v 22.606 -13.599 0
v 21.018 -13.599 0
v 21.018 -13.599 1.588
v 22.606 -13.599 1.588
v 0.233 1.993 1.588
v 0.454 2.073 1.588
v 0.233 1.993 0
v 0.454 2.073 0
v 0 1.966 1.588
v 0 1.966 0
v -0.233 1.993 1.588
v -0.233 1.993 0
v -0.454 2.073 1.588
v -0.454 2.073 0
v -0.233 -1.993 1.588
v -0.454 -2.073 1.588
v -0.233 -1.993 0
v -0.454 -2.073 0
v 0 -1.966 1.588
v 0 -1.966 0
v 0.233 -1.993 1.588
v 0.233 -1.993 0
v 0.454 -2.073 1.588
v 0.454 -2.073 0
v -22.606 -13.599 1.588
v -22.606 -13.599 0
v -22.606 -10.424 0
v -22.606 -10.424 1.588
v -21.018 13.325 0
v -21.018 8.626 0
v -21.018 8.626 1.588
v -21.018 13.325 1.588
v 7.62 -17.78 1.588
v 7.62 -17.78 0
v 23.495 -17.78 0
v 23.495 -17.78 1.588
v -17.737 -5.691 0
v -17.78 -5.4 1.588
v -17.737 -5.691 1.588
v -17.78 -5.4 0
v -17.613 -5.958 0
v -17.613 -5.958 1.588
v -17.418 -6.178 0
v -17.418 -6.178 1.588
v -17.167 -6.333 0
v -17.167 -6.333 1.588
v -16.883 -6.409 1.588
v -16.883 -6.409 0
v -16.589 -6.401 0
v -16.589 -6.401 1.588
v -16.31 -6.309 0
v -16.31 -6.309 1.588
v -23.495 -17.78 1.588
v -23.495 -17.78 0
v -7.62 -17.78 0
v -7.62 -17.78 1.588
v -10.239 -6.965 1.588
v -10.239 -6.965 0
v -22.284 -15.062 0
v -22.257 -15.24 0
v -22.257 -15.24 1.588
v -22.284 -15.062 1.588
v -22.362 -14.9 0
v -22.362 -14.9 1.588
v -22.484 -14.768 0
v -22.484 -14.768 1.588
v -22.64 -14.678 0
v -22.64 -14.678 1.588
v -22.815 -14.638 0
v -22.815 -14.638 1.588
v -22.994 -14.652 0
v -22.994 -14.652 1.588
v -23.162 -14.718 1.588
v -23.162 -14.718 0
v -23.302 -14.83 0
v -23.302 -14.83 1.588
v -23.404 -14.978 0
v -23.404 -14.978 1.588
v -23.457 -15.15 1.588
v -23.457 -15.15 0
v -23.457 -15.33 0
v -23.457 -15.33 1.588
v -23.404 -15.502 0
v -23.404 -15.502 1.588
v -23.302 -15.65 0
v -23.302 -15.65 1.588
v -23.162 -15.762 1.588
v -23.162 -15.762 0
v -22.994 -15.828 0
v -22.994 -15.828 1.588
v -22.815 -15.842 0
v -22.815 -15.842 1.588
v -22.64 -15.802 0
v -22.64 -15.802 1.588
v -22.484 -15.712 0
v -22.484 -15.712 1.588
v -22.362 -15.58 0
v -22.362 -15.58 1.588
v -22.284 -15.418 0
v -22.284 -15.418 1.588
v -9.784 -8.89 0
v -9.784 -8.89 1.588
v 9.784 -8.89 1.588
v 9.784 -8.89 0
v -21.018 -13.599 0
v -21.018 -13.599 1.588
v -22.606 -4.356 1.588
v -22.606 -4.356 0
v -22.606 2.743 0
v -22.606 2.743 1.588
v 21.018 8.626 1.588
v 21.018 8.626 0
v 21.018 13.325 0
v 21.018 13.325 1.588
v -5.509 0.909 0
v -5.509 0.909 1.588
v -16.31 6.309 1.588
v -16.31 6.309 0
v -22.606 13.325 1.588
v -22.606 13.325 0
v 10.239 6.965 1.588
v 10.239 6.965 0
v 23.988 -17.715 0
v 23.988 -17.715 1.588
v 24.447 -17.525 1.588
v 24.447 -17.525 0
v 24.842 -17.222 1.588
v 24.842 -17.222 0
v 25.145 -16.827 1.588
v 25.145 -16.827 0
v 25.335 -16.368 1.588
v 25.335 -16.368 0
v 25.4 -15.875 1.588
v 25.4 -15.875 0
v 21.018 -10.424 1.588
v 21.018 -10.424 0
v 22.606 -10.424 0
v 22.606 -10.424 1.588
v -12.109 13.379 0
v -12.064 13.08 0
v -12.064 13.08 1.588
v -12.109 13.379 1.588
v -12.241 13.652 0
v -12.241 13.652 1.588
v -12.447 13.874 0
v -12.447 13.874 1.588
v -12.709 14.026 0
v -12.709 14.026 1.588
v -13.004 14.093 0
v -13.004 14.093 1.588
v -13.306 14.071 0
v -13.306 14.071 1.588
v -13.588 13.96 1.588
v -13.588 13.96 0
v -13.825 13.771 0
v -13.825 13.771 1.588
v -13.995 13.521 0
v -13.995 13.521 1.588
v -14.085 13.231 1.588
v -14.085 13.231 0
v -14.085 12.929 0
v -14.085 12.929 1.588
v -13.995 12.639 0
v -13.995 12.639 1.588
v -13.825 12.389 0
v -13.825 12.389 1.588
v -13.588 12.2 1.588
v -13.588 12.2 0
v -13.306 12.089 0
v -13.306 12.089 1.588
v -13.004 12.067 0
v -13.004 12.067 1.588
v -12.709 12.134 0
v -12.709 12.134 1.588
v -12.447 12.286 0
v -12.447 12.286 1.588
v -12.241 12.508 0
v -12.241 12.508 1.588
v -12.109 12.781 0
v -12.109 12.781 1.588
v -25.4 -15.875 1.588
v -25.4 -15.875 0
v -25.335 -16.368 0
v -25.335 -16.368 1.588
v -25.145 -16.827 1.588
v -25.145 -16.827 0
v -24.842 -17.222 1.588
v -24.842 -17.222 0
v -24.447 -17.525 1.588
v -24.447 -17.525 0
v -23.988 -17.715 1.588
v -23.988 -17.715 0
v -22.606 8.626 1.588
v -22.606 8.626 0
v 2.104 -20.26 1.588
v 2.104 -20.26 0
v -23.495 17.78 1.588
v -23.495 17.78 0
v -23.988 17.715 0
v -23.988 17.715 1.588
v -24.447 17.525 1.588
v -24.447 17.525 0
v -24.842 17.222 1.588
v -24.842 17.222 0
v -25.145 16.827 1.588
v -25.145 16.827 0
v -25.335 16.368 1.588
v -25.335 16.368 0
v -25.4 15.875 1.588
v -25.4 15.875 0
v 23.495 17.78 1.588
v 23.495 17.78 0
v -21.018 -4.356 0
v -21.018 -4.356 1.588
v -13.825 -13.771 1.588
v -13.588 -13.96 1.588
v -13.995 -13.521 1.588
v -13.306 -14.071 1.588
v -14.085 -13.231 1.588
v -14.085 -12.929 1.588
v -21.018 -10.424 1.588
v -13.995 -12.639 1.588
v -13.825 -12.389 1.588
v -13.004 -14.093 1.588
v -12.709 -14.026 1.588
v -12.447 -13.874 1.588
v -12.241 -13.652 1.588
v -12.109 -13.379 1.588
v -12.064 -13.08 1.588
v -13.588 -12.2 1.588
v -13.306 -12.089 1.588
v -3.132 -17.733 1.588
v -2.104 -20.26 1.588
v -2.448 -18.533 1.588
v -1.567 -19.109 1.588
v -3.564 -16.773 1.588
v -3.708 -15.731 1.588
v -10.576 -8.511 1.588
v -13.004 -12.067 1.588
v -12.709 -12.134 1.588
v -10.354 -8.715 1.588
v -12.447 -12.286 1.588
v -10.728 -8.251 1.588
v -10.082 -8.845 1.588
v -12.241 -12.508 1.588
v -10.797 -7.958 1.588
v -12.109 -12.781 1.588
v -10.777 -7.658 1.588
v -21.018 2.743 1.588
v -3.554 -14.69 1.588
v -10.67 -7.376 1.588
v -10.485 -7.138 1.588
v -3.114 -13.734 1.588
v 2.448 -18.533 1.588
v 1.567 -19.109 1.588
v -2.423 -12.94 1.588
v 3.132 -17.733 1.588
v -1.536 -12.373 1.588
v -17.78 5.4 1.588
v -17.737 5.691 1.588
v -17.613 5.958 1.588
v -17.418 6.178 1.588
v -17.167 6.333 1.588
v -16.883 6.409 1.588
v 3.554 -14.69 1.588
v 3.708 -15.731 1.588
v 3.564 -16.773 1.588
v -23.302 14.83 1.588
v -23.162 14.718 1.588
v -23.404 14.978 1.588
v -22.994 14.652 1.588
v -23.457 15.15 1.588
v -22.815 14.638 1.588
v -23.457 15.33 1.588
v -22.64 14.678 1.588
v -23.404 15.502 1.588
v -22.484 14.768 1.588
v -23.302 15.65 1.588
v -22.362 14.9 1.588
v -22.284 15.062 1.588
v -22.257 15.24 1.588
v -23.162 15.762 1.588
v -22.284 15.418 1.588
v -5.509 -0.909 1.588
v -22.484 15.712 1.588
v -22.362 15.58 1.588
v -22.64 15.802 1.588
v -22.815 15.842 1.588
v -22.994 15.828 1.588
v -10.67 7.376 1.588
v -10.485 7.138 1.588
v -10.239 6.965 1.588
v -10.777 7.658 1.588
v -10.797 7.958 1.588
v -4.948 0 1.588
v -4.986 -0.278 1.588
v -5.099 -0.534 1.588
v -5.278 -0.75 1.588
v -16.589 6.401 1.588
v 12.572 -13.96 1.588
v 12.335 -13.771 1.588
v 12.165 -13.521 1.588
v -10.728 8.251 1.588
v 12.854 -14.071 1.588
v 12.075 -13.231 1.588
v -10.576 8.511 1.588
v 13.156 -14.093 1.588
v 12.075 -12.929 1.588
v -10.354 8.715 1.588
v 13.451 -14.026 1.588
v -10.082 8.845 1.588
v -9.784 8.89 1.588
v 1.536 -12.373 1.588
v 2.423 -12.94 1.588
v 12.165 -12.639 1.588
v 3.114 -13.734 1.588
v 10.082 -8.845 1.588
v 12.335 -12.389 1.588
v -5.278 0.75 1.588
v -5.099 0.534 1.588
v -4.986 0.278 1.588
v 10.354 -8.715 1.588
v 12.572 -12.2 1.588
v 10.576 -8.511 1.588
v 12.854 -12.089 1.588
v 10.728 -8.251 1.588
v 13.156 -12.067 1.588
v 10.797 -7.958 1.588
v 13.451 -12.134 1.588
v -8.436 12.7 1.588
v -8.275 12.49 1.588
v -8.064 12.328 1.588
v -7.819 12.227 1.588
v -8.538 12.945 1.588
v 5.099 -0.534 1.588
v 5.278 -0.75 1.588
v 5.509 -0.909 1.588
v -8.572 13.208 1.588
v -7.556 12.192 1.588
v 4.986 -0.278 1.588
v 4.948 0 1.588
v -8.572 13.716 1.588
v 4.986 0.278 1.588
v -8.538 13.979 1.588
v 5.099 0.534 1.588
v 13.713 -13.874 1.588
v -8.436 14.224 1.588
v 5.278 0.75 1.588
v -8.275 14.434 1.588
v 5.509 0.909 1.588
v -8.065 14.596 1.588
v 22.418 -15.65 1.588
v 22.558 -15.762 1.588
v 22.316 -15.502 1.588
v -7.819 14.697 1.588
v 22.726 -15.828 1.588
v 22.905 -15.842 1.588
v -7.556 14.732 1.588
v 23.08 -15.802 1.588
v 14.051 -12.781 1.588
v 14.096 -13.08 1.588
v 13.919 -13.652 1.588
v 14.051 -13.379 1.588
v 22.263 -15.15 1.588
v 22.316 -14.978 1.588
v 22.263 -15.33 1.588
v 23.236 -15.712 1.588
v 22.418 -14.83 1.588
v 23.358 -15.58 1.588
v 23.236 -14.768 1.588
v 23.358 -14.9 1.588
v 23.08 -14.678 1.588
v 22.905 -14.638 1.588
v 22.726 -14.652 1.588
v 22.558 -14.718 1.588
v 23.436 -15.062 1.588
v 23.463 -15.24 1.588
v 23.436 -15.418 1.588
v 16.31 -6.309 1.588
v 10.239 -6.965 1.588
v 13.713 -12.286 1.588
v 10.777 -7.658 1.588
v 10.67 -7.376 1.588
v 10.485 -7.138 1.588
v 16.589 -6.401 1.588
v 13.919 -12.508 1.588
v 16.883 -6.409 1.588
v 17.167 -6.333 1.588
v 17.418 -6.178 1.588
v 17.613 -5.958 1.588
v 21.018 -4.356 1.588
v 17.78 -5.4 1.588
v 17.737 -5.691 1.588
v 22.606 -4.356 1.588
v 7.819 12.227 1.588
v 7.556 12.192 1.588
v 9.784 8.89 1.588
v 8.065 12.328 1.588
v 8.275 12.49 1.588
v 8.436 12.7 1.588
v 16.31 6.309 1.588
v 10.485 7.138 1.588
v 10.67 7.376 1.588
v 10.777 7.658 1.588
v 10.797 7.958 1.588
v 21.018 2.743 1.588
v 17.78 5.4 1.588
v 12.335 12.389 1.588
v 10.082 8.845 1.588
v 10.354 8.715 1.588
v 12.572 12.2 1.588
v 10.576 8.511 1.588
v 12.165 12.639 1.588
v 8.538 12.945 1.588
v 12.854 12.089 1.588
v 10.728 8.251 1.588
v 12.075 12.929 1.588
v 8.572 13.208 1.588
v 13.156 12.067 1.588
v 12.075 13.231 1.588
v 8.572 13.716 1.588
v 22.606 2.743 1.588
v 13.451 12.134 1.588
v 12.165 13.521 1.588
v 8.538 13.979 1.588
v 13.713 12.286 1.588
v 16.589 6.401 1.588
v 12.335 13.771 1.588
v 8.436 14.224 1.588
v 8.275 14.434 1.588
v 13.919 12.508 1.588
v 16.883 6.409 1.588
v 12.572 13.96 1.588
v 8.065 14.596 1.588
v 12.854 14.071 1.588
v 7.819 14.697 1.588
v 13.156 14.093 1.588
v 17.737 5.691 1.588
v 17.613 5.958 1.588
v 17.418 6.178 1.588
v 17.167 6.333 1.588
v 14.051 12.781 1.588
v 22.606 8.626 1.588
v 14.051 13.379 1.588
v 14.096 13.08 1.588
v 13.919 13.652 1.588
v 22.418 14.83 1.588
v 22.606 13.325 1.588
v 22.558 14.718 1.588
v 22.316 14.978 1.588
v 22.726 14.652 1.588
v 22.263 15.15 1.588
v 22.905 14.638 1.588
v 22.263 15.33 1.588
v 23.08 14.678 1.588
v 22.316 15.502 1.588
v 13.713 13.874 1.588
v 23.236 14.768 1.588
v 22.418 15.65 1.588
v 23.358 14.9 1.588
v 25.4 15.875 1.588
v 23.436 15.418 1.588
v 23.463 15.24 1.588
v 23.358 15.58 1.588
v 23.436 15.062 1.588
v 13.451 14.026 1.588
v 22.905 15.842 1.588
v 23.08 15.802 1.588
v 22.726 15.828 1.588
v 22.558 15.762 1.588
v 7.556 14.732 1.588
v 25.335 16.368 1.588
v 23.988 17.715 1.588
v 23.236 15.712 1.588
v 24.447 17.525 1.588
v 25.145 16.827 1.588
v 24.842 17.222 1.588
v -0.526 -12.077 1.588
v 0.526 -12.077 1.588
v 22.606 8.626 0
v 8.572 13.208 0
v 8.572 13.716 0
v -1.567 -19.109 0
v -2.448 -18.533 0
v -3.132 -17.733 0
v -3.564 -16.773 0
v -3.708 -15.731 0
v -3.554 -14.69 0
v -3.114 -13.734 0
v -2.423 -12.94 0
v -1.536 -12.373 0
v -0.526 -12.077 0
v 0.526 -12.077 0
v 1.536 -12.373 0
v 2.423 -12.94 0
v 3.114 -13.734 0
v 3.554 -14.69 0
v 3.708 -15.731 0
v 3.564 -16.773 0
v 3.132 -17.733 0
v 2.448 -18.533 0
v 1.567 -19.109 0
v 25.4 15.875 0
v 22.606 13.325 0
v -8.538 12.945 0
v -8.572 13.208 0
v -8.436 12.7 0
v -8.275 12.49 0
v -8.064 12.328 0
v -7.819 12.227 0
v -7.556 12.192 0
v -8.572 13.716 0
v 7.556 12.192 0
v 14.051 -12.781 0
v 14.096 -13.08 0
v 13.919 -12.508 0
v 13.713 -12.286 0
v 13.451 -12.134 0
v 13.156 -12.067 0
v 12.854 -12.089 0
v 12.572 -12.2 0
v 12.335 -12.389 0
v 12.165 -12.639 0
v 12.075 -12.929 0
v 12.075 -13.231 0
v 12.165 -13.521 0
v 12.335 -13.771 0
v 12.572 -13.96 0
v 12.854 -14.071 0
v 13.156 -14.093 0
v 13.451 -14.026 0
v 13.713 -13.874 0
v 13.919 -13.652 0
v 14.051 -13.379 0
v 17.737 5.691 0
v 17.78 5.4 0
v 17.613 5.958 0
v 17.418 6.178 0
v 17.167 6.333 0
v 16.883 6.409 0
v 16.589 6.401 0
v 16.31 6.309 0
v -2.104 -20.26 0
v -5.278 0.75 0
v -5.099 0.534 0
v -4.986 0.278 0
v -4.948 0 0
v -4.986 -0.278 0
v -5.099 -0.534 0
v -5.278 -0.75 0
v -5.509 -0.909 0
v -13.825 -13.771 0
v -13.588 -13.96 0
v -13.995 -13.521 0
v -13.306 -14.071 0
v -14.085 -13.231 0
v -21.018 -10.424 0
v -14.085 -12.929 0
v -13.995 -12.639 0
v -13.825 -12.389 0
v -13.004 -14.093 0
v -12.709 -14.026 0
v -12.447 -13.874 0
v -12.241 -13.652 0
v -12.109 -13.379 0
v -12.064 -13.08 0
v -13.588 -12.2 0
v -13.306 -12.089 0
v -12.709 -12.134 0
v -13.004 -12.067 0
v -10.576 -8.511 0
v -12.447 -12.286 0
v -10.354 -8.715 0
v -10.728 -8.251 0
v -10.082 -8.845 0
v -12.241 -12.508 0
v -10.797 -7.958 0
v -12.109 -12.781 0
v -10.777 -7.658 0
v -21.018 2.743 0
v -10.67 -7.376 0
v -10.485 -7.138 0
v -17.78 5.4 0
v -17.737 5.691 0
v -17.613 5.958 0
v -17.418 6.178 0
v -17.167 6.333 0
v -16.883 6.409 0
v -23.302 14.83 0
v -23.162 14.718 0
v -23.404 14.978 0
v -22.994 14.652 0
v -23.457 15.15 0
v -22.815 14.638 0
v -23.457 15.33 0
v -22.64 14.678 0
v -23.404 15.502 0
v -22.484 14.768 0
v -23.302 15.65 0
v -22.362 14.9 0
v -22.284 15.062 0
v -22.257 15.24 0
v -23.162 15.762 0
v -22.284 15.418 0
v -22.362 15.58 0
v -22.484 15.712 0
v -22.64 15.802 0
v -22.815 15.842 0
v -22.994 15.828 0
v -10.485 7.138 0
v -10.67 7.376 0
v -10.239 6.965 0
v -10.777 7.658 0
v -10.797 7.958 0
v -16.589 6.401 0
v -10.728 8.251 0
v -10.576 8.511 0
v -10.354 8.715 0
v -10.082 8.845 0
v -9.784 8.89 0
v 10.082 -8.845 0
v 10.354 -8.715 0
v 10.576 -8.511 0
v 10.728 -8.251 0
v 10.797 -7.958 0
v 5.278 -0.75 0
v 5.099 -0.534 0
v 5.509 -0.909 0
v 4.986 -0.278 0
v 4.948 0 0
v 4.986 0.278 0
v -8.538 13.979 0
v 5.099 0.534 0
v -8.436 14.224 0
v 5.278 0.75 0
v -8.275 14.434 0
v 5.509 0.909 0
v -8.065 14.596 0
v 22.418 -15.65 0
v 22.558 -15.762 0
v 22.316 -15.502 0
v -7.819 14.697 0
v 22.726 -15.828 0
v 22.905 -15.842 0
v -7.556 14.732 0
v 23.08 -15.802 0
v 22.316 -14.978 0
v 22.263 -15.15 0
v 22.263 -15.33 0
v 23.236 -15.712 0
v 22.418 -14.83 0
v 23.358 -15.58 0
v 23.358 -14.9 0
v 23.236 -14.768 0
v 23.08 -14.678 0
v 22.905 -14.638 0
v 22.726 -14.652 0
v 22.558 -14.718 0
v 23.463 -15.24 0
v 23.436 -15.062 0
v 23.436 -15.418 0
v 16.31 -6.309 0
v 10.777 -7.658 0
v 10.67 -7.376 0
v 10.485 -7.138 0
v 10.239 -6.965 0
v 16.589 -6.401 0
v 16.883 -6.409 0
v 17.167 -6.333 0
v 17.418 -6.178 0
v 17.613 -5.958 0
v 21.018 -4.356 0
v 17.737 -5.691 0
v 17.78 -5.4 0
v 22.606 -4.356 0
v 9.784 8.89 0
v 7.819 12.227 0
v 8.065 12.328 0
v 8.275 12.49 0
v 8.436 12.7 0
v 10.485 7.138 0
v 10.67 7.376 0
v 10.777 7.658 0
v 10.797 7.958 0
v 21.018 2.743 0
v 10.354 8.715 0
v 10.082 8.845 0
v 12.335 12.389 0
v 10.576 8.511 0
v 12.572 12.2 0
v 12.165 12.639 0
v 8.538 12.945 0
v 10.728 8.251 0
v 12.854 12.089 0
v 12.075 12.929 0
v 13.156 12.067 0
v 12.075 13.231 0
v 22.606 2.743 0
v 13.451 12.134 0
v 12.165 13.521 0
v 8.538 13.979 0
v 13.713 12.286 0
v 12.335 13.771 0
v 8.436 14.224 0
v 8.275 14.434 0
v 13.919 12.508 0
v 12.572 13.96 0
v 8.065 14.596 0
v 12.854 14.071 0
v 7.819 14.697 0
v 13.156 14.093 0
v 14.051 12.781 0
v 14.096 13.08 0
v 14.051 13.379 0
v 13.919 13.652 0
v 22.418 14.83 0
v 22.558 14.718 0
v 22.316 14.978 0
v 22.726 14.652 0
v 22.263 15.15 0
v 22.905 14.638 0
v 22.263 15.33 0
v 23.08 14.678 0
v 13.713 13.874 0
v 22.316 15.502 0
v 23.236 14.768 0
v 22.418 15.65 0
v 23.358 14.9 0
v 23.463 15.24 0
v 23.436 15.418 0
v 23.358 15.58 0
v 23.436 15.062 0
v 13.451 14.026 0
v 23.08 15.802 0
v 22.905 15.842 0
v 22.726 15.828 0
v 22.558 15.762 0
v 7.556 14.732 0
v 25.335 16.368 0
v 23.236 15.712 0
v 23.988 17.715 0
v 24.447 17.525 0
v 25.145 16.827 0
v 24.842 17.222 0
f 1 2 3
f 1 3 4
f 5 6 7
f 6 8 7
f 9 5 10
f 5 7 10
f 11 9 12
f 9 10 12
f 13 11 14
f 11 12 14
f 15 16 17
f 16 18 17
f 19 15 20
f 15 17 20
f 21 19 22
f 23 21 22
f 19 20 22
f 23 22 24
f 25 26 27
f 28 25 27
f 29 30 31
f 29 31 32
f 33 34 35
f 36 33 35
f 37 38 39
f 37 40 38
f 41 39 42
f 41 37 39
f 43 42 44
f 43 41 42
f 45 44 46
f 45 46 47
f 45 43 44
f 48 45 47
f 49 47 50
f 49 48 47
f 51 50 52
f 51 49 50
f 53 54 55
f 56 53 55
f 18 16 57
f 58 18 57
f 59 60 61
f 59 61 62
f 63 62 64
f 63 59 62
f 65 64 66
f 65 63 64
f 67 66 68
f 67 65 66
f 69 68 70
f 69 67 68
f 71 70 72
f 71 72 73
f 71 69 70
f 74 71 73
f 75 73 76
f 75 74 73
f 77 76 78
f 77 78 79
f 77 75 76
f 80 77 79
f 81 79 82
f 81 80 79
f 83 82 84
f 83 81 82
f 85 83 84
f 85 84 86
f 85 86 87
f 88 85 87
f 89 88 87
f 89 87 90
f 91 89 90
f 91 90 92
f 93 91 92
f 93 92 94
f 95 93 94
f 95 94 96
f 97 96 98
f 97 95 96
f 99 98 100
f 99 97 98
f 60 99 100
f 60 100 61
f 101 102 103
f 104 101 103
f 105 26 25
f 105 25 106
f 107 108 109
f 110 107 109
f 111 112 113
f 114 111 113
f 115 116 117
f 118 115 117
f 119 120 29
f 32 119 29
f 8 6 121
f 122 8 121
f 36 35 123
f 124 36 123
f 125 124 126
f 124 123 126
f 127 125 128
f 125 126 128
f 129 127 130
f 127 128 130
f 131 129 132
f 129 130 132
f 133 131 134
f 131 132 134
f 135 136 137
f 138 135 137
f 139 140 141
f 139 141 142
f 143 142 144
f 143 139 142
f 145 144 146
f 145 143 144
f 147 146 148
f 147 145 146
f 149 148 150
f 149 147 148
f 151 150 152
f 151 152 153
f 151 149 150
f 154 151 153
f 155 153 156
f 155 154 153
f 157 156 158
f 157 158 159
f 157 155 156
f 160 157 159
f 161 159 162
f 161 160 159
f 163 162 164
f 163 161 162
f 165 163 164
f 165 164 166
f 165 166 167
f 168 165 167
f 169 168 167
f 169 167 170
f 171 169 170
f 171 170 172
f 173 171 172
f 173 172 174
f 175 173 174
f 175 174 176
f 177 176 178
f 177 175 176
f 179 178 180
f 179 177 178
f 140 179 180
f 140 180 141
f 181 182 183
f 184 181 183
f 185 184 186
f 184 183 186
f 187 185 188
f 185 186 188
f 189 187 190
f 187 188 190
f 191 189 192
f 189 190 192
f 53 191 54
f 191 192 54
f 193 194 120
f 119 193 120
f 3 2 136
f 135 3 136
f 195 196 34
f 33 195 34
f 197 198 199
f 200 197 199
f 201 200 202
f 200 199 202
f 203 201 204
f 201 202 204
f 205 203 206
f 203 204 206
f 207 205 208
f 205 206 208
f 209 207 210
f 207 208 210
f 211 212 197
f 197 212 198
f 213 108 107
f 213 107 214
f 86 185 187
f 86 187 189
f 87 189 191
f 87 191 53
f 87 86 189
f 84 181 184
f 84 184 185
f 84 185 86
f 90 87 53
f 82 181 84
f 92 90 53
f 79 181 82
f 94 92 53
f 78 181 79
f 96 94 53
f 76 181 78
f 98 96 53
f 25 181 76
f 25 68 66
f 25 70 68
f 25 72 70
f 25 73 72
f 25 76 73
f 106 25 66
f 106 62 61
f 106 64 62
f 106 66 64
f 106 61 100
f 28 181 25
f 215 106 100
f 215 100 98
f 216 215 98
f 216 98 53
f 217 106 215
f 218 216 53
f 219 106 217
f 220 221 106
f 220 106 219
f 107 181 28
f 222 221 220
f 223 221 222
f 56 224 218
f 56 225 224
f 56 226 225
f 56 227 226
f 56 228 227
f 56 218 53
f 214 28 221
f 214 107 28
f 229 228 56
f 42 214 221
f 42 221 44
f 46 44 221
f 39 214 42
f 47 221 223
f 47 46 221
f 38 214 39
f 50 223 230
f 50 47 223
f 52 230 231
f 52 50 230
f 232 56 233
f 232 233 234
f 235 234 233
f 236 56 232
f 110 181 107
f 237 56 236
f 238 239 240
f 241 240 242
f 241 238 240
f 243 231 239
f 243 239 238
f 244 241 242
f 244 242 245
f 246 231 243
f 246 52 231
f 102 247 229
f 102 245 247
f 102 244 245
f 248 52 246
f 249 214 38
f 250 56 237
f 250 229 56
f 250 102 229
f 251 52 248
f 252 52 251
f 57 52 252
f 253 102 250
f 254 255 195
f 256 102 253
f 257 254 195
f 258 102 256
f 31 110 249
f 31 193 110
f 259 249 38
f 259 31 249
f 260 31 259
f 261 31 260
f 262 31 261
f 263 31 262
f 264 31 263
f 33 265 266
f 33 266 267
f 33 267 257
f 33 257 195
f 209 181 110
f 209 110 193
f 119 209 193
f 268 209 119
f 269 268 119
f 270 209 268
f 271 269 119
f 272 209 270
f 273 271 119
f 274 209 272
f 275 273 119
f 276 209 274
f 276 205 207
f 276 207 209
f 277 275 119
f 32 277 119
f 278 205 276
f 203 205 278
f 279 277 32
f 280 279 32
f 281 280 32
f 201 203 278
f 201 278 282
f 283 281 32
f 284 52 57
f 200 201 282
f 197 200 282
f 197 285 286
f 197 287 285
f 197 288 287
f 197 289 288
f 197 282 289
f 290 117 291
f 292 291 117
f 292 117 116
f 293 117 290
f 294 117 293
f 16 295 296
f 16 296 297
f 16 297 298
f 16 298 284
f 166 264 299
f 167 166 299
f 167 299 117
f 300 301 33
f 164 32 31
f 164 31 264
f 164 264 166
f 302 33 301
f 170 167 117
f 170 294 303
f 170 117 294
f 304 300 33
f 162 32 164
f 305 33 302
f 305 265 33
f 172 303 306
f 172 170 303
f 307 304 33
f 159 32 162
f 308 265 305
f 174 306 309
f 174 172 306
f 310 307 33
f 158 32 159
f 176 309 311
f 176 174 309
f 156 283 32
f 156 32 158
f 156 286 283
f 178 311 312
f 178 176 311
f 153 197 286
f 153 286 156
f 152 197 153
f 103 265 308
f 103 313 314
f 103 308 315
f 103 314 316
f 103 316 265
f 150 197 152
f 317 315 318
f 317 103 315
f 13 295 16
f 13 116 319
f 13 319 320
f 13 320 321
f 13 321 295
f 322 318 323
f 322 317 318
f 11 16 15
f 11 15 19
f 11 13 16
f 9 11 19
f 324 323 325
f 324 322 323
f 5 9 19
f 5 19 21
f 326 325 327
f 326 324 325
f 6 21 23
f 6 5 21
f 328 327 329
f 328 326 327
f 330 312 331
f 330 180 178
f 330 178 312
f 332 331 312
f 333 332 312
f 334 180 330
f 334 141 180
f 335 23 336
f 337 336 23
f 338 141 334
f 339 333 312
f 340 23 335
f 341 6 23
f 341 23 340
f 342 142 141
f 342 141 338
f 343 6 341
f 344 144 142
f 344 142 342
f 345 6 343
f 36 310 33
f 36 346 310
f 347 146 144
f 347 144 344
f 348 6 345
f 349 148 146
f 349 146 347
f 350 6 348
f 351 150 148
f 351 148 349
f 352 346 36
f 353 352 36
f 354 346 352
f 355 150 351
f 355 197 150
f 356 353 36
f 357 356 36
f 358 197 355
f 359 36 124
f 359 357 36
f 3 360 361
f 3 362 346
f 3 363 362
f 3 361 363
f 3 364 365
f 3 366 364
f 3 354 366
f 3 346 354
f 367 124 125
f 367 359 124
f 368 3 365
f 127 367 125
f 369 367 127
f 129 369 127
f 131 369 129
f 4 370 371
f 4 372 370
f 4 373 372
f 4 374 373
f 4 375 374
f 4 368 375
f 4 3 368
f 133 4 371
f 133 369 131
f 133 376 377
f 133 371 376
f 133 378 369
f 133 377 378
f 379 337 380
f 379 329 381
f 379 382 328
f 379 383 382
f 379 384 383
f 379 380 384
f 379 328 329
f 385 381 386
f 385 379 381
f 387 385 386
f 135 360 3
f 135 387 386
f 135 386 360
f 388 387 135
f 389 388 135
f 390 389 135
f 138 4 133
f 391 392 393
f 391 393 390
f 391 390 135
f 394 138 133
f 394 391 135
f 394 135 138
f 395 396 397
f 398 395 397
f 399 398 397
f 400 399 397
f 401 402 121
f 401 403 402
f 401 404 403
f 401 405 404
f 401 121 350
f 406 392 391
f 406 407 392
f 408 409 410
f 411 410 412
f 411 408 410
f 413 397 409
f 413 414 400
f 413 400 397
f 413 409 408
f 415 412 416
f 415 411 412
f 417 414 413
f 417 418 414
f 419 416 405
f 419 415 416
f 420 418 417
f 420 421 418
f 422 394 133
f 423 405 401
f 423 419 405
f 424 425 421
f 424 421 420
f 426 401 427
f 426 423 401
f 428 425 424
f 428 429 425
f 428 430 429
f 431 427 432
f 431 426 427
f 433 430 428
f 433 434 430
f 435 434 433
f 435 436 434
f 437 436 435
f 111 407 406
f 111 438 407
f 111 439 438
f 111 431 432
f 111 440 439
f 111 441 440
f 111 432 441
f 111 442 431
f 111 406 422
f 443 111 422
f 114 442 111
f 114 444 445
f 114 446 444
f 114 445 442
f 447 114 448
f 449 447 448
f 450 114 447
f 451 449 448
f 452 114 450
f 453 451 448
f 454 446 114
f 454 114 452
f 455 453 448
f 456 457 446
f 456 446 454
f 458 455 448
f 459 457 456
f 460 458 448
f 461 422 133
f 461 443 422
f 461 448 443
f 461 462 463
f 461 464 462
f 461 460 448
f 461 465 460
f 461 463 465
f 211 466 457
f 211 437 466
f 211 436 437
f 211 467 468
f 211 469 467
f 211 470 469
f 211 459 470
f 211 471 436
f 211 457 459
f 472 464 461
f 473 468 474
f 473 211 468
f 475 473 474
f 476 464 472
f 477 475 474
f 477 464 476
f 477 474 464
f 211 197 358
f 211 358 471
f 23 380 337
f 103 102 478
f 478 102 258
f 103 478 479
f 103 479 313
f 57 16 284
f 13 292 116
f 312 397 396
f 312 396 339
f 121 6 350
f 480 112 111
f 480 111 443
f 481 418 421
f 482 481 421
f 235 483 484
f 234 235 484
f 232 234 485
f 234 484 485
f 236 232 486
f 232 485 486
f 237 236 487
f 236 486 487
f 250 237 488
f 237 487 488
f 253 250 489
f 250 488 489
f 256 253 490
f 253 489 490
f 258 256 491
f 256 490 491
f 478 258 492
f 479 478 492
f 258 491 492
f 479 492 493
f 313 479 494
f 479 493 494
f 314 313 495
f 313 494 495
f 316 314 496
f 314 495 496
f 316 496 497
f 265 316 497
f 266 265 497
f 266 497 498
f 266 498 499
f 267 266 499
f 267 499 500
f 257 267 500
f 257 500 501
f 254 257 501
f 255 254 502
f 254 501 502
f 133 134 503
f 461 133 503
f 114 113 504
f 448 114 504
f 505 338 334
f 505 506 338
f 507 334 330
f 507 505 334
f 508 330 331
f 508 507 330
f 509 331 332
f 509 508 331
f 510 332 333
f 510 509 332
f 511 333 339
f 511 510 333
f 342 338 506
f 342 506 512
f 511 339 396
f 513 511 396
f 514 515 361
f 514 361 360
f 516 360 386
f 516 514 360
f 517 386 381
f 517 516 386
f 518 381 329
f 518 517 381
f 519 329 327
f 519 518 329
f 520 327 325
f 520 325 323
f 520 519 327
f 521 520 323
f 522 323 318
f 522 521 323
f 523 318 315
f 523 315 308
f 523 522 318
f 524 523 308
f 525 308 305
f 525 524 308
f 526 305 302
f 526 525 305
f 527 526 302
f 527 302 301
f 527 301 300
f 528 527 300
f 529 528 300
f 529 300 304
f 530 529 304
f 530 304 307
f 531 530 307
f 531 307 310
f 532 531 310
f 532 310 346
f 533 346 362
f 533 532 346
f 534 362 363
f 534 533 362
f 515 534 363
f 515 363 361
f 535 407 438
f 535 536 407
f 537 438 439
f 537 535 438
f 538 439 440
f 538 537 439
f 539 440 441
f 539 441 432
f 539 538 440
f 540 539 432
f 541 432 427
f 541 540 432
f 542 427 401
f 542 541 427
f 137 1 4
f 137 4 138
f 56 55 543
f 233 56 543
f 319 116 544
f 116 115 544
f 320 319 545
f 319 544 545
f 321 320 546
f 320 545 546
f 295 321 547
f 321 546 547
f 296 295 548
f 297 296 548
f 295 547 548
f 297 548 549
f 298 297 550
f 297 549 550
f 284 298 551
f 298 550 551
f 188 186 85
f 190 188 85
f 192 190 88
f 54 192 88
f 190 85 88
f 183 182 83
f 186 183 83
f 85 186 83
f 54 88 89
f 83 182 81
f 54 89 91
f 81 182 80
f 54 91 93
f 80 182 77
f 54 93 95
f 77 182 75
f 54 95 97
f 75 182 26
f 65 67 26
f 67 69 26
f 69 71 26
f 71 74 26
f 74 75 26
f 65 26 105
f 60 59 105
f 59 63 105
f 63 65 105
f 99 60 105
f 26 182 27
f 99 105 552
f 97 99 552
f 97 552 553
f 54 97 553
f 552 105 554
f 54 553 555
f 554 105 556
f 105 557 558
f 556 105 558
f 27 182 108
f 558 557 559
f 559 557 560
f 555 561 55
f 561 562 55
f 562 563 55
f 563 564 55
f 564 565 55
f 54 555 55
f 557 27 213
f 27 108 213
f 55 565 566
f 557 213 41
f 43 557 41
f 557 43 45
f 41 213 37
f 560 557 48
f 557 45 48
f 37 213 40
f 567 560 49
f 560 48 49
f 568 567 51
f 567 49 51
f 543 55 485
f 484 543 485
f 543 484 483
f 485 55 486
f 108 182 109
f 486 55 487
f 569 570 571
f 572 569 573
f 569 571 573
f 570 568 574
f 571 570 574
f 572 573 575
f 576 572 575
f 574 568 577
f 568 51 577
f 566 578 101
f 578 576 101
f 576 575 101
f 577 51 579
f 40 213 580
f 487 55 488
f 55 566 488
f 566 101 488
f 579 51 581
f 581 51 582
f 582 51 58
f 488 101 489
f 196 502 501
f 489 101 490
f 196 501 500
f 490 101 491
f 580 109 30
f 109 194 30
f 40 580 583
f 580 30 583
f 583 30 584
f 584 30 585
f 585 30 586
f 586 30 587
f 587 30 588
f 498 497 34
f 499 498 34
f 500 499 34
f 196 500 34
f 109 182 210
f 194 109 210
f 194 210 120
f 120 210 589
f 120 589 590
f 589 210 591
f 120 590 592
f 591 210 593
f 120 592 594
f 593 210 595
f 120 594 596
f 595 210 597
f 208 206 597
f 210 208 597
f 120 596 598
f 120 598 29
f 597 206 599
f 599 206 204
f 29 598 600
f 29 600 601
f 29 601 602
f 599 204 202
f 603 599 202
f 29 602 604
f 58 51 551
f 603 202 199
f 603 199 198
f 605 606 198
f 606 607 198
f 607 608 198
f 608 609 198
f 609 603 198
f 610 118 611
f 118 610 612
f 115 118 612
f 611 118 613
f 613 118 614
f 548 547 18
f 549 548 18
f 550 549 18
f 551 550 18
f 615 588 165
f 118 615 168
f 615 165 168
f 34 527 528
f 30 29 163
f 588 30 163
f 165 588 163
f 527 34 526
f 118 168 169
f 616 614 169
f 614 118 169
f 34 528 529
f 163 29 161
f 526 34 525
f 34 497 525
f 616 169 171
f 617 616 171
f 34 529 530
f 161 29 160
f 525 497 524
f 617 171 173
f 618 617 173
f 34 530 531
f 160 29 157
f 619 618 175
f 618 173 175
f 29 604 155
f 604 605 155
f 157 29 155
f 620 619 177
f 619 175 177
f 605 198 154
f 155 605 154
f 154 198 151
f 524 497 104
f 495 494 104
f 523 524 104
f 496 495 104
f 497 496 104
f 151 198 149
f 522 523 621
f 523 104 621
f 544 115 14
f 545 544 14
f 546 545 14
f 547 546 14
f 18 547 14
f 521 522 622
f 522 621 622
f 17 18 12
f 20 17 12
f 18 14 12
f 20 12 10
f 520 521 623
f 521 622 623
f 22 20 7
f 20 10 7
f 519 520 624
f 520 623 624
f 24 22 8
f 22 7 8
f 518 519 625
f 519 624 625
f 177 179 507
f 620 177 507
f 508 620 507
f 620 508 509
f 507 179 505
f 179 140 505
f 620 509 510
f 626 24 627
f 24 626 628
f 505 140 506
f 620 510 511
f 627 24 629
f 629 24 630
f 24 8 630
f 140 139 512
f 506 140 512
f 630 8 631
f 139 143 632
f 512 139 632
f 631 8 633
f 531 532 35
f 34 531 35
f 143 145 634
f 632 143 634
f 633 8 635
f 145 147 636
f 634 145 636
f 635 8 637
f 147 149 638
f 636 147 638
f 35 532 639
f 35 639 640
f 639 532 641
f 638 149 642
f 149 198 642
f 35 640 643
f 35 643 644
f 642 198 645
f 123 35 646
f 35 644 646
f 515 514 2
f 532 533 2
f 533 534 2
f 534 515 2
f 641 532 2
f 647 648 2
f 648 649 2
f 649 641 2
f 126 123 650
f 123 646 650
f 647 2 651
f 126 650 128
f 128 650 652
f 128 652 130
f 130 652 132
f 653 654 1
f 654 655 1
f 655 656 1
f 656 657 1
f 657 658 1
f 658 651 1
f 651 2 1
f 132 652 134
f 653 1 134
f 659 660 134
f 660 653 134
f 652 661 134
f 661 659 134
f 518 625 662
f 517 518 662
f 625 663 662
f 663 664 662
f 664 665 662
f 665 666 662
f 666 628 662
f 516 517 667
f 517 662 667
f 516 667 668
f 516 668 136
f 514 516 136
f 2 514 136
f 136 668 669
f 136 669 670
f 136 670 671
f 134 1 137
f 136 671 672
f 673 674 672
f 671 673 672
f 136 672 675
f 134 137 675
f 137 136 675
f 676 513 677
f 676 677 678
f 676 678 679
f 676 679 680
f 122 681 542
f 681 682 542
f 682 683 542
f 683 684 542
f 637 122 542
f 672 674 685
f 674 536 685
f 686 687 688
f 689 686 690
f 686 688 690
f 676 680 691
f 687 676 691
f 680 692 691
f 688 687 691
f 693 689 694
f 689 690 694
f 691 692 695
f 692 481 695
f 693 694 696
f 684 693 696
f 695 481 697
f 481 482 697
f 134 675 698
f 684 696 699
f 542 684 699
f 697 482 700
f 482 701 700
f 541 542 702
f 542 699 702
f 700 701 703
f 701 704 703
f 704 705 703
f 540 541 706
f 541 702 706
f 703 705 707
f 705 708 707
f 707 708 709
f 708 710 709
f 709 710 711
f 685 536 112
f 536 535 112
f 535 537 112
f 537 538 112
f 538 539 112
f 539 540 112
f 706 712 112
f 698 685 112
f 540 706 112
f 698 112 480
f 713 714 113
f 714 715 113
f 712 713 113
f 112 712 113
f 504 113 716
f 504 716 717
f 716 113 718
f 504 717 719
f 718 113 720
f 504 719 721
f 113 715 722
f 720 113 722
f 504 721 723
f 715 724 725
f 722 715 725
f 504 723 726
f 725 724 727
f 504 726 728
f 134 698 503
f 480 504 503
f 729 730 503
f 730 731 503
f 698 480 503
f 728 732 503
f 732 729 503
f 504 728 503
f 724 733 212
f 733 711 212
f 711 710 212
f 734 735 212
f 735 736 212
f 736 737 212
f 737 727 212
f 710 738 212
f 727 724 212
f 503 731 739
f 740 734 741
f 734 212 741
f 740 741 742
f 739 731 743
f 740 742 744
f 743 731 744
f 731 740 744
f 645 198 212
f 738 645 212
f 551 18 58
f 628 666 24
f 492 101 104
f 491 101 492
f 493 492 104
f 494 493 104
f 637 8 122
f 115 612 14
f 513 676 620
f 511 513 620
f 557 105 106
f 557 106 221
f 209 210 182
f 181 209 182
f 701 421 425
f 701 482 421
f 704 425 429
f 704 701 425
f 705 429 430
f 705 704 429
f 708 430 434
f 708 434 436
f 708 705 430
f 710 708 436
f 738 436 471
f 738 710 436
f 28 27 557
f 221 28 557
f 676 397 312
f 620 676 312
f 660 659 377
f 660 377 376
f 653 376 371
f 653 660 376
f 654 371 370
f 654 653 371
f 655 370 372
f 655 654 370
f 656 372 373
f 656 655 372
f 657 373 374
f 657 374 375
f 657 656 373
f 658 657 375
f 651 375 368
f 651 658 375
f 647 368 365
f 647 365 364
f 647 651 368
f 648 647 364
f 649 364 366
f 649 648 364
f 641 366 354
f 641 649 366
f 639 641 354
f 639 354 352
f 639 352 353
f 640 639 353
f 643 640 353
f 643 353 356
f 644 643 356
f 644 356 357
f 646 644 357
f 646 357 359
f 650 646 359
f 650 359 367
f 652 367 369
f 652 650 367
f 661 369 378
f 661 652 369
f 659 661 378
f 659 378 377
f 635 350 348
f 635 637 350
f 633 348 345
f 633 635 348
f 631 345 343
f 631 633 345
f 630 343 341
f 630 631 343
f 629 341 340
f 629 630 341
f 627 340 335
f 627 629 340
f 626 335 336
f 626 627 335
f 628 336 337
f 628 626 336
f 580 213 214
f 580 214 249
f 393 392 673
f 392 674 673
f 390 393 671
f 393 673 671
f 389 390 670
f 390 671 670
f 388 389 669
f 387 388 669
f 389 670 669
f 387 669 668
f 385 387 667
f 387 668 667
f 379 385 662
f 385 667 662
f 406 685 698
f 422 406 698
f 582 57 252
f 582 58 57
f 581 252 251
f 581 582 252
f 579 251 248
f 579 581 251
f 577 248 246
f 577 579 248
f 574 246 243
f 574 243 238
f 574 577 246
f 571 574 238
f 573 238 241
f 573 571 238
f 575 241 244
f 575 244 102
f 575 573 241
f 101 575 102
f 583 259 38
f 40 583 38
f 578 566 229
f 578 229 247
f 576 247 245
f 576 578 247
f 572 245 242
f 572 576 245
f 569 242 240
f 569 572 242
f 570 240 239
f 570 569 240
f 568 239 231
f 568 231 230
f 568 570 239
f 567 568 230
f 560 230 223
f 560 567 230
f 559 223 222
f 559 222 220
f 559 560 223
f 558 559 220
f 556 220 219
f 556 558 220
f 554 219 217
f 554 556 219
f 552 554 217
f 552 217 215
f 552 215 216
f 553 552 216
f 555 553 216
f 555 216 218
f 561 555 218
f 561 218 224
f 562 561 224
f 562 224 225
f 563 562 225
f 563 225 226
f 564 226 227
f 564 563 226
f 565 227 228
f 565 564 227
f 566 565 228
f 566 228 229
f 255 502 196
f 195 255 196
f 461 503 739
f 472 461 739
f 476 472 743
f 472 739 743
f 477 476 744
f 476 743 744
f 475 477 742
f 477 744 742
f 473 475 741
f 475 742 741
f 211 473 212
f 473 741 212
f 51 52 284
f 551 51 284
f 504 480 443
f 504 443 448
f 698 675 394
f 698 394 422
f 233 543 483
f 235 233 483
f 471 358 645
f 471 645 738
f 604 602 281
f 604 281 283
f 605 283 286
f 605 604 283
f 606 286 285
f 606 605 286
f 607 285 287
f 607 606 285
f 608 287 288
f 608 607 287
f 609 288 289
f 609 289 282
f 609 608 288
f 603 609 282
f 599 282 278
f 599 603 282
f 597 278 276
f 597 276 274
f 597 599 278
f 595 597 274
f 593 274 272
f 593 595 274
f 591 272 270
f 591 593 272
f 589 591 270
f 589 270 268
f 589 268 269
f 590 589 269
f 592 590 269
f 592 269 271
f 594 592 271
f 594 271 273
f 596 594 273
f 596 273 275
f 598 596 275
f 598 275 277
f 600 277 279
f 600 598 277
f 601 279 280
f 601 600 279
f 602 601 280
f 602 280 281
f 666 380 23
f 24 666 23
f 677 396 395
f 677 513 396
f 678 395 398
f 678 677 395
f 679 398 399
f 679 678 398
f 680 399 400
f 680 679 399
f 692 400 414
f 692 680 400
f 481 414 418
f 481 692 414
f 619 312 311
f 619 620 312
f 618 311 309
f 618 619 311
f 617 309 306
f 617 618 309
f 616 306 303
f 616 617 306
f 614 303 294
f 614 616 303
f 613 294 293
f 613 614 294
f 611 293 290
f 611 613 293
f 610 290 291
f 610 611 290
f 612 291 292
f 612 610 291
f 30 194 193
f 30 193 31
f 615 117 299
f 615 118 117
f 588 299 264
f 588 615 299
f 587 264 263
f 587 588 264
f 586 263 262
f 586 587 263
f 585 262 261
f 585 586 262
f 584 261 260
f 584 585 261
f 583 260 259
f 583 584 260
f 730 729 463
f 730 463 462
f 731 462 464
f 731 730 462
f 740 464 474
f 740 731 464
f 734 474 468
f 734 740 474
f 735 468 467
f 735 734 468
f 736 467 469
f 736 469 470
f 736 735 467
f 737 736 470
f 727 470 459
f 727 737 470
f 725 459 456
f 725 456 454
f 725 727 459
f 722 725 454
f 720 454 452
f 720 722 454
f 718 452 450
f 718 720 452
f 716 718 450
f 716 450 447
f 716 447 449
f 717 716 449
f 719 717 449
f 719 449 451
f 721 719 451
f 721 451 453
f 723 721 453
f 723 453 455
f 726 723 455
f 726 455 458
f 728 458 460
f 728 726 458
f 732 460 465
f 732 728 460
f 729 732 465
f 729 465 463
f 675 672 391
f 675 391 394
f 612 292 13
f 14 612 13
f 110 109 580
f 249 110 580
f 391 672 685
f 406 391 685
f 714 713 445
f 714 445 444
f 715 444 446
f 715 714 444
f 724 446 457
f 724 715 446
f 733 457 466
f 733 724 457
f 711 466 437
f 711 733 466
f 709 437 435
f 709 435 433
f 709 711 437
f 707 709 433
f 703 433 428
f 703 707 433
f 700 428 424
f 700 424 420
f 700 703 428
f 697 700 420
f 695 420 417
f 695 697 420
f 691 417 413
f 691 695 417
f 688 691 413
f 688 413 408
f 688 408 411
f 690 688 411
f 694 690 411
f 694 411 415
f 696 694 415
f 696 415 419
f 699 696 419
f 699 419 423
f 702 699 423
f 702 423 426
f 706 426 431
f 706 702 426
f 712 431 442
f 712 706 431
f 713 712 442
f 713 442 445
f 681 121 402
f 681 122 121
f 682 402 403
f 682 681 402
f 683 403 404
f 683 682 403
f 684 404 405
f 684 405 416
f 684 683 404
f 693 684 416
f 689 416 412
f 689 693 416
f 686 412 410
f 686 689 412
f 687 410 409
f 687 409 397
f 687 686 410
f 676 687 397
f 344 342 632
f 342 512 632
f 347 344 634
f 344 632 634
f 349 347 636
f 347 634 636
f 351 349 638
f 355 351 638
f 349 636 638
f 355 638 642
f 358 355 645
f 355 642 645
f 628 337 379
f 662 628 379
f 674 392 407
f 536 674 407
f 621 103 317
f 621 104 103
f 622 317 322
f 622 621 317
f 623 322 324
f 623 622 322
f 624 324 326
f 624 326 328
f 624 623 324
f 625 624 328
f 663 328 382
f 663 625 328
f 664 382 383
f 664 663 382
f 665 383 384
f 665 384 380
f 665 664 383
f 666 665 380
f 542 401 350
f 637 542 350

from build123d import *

# Parameters (mm, degrees)
SKETCH1_R           = 0.60325
SKETCH1_W           = 1.5875
SKETCH1_H           = 3.175
SKETCH1_R_2         = 1.016
SKETCH1_H_2         = 7.0993
SKETCH1_H_3         = 4.699
BOSS_EXTRUDE1_DEPTH = 1.5875
SPEED_HOLES_REACH   = 34.529
SKETCH2_W           = 17.145
SKETCH2_H           = 2.54
FILLET1_R           = 1.016


with BuildPart() as part:
    # Sketch1 → Boss-Extrude1 (new body)
    with BuildSketch(Plane.XY):
        with BuildLine():
            ThreePointArc((25.4, 15.875), (24.842038418, 17.222038418), (23.495, 17.78))
            Line((23.495, 17.78), (-23.495, 17.78))
            ThreePointArc((-23.495, 17.78), (-24.842038418, 17.222038418), (-25.4, 15.875))
            Line((-25.4, 15.875), (-25.4, -15.875))
            ThreePointArc((-25.4, -15.875), (-24.842038418, -17.222038418), (-23.495, -17.78))
            Line((-23.495, -17.78), (-7.62, -17.78))
            Line((-7.62, -17.78), (-2.103962754, -20.259962687))
            Line((-2.103962754, -20.259962687), (-1.567237562, -19.108951797))
            ThreePointArc((-1.567237562, -19.108951797), (0, -12.0396), (1.567237562, -19.108951797))
            Line((1.567237562, -19.108951797), (2.103962754, -20.259962687))
            Line((2.103962754, -20.259962687), (7.62, -17.78))
            Line((7.62, -17.78), (23.495, -17.78))
            ThreePointArc((23.495, -17.78), (24.842038418, -17.222038418), (25.4, -15.875))
            Line((25.4, -15.875), (25.4, 15.875))
        make_face()
        with Locations((-22.86, -15.24)):
            Circle(SKETCH1_R, mode=Mode.SUBTRACT)
        with Locations((-21.81225, -12.011129894)):
            Rectangle(SKETCH1_W, SKETCH1_H, mode=Mode.SUBTRACT)
        with Locations((-13.08, -13.08)):
            Circle(SKETCH1_R_2, mode=Mode.SUBTRACT)
        with Locations((13.08, -13.08)):
            Circle(SKETCH1_R_2, mode=Mode.SUBTRACT)
        with Locations((22.86, -15.24)):
            Circle(SKETCH1_R, mode=Mode.SUBTRACT)
        with Locations((21.81225, -12.011129894)):
            Rectangle(SKETCH1_W, SKETCH1_H, mode=Mode.SUBTRACT)
        with Locations((-21.81225, -0.80645)):
            Rectangle(SKETCH1_W, SKETCH1_H_2, mode=Mode.SUBTRACT)
        with Locations((-21.81225, 10.975870106)):
            Rectangle(SKETCH1_W, SKETCH1_H_3, mode=Mode.SUBTRACT)
        with Locations((-22.86, 15.24)):
            Circle(SKETCH1_R, mode=Mode.SUBTRACT)
        with Locations((-13.08, 13.08)):
            Circle(SKETCH1_R_2, mode=Mode.SUBTRACT)
        with Locations((21.81225, -0.80645)):
            Rectangle(SKETCH1_W, SKETCH1_H_2, mode=Mode.SUBTRACT)
        with Locations((21.81225, 10.975870106)):
            Rectangle(SKETCH1_W, SKETCH1_H_3, mode=Mode.SUBTRACT)
        with Locations((13.08, 13.08)):
            Circle(SKETCH1_R_2, mode=Mode.SUBTRACT)
        with Locations((22.86, 15.24)):
            Circle(SKETCH1_R, mode=Mode.SUBTRACT)
    extrude(amount=BOSS_EXTRUDE1_DEPTH)

    # Sketch2 → Speed Holes (cut, up to next)
    with BuildSketch(Plane.XY.offset(1.5875), mode=Mode.PRIVATE) as speed_holes_sk1:
        Polygon((3.691748231, 0), (17.78, -7.044125885), (17.78, 7.044125885), align=None)
    speed_holes_tool1 = extrude(speed_holes_sk1.sketch, amount=-SPEED_HOLES_REACH, mode=Mode.PRIVATE) & part.part
    # Sketch2 → Speed Holes (cut, up to next)
    with BuildSketch(Plane.XY.offset(1.5875), mode=Mode.PRIVATE) as speed_holes_sk2:
        Polygon((-14.088251769, 8.89), (0, 1.845874115), (14.088251769, 8.89), align=None)
    speed_holes_tool2 = extrude(speed_holes_sk2.sketch, amount=-SPEED_HOLES_REACH, mode=Mode.PRIVATE) & part.part
    # Sketch2 → Speed Holes (cut, up to next)
    with BuildSketch(Plane.XY.offset(1.5875), mode=Mode.PRIVATE) as speed_holes_sk3:
        Polygon((14.088251769, -8.89), (0, -1.845874115), (-14.088251769, -8.89), align=None)
    speed_holes_tool3 = extrude(speed_holes_sk3.sketch, amount=-SPEED_HOLES_REACH, mode=Mode.PRIVATE) & part.part
    # Sketch2 → Speed Holes (cut, up to next)
    with BuildSketch(Plane.XY.offset(1.5875), mode=Mode.PRIVATE) as speed_holes_sk4:
        Polygon((-17.78, -7.044125885), (-3.691748231, 0), (-17.78, 7.044125885), align=None)
    speed_holes_tool4 = extrude(speed_holes_sk4.sketch, amount=-SPEED_HOLES_REACH, mode=Mode.PRIVATE) & part.part
    # Sketch2 → Speed Holes (cut, up to next)
    with BuildSketch(Plane.XY.offset(1.5875), mode=Mode.PRIVATE) as speed_holes_sk5:
        with Locations((0, 13.462)):
            Rectangle(SKETCH2_W, SKETCH2_H)
    speed_holes_tool5 = extrude(speed_holes_sk5.sketch, amount=-SPEED_HOLES_REACH, mode=Mode.PRIVATE) & part.part
    add(speed_holes_tool1.solids().sort_by_distance((13.083916, 0, 1.5875))[0], mode=Mode.SUBTRACT)
    add(speed_holes_tool2.solids().sort_by_distance((0, 6.541958, 1.5875))[0], mode=Mode.SUBTRACT)
    add(speed_holes_tool3.solids().sort_by_distance((0, -6.541958, 1.5875))[0], mode=Mode.SUBTRACT)
    add(speed_holes_tool4.solids().sort_by_distance((-13.083916, 0, 1.5875))[0], mode=Mode.SUBTRACT)
    add(speed_holes_tool5.solids().sort_by_distance((0, 13.462, 1.5875))[0], mode=Mode.SUBTRACT)

    # Fillet1
    fillet1_edges = [part.edges().sort_by_distance(p)[0] for p in [
        (-14.088251769, -8.89, 0.79375),
        (-17.78, -7.044125885, 0.79375),
        (0, 1.845874115, 0.79375),
        (14.088251769, -8.89, 0.79375),
        (17.78, -7.044125885, 0.79375),
        (17.78, 7.044125885, 0.79375),
        (-3.691748231, 0, 0.79375),
        (14.088251769, 8.89, 0.79375),
        (3.691748231, 0, 0.79375),
        (-14.088251769, 8.89, 0.79375),
        (0, -1.845874115, 0.79375),
        (-17.78, 7.044125885, 0.79375),
        (-8.5725, 14.732, 0.79375),
        (-8.5725, 12.192, 0.79375),
        (8.5725, 14.732, 0.79375),
        (8.5725, 12.192, 0.79375),
    ]]
    fillet(fillet1_edges, radius=FILLET1_R)


solid = part.part
